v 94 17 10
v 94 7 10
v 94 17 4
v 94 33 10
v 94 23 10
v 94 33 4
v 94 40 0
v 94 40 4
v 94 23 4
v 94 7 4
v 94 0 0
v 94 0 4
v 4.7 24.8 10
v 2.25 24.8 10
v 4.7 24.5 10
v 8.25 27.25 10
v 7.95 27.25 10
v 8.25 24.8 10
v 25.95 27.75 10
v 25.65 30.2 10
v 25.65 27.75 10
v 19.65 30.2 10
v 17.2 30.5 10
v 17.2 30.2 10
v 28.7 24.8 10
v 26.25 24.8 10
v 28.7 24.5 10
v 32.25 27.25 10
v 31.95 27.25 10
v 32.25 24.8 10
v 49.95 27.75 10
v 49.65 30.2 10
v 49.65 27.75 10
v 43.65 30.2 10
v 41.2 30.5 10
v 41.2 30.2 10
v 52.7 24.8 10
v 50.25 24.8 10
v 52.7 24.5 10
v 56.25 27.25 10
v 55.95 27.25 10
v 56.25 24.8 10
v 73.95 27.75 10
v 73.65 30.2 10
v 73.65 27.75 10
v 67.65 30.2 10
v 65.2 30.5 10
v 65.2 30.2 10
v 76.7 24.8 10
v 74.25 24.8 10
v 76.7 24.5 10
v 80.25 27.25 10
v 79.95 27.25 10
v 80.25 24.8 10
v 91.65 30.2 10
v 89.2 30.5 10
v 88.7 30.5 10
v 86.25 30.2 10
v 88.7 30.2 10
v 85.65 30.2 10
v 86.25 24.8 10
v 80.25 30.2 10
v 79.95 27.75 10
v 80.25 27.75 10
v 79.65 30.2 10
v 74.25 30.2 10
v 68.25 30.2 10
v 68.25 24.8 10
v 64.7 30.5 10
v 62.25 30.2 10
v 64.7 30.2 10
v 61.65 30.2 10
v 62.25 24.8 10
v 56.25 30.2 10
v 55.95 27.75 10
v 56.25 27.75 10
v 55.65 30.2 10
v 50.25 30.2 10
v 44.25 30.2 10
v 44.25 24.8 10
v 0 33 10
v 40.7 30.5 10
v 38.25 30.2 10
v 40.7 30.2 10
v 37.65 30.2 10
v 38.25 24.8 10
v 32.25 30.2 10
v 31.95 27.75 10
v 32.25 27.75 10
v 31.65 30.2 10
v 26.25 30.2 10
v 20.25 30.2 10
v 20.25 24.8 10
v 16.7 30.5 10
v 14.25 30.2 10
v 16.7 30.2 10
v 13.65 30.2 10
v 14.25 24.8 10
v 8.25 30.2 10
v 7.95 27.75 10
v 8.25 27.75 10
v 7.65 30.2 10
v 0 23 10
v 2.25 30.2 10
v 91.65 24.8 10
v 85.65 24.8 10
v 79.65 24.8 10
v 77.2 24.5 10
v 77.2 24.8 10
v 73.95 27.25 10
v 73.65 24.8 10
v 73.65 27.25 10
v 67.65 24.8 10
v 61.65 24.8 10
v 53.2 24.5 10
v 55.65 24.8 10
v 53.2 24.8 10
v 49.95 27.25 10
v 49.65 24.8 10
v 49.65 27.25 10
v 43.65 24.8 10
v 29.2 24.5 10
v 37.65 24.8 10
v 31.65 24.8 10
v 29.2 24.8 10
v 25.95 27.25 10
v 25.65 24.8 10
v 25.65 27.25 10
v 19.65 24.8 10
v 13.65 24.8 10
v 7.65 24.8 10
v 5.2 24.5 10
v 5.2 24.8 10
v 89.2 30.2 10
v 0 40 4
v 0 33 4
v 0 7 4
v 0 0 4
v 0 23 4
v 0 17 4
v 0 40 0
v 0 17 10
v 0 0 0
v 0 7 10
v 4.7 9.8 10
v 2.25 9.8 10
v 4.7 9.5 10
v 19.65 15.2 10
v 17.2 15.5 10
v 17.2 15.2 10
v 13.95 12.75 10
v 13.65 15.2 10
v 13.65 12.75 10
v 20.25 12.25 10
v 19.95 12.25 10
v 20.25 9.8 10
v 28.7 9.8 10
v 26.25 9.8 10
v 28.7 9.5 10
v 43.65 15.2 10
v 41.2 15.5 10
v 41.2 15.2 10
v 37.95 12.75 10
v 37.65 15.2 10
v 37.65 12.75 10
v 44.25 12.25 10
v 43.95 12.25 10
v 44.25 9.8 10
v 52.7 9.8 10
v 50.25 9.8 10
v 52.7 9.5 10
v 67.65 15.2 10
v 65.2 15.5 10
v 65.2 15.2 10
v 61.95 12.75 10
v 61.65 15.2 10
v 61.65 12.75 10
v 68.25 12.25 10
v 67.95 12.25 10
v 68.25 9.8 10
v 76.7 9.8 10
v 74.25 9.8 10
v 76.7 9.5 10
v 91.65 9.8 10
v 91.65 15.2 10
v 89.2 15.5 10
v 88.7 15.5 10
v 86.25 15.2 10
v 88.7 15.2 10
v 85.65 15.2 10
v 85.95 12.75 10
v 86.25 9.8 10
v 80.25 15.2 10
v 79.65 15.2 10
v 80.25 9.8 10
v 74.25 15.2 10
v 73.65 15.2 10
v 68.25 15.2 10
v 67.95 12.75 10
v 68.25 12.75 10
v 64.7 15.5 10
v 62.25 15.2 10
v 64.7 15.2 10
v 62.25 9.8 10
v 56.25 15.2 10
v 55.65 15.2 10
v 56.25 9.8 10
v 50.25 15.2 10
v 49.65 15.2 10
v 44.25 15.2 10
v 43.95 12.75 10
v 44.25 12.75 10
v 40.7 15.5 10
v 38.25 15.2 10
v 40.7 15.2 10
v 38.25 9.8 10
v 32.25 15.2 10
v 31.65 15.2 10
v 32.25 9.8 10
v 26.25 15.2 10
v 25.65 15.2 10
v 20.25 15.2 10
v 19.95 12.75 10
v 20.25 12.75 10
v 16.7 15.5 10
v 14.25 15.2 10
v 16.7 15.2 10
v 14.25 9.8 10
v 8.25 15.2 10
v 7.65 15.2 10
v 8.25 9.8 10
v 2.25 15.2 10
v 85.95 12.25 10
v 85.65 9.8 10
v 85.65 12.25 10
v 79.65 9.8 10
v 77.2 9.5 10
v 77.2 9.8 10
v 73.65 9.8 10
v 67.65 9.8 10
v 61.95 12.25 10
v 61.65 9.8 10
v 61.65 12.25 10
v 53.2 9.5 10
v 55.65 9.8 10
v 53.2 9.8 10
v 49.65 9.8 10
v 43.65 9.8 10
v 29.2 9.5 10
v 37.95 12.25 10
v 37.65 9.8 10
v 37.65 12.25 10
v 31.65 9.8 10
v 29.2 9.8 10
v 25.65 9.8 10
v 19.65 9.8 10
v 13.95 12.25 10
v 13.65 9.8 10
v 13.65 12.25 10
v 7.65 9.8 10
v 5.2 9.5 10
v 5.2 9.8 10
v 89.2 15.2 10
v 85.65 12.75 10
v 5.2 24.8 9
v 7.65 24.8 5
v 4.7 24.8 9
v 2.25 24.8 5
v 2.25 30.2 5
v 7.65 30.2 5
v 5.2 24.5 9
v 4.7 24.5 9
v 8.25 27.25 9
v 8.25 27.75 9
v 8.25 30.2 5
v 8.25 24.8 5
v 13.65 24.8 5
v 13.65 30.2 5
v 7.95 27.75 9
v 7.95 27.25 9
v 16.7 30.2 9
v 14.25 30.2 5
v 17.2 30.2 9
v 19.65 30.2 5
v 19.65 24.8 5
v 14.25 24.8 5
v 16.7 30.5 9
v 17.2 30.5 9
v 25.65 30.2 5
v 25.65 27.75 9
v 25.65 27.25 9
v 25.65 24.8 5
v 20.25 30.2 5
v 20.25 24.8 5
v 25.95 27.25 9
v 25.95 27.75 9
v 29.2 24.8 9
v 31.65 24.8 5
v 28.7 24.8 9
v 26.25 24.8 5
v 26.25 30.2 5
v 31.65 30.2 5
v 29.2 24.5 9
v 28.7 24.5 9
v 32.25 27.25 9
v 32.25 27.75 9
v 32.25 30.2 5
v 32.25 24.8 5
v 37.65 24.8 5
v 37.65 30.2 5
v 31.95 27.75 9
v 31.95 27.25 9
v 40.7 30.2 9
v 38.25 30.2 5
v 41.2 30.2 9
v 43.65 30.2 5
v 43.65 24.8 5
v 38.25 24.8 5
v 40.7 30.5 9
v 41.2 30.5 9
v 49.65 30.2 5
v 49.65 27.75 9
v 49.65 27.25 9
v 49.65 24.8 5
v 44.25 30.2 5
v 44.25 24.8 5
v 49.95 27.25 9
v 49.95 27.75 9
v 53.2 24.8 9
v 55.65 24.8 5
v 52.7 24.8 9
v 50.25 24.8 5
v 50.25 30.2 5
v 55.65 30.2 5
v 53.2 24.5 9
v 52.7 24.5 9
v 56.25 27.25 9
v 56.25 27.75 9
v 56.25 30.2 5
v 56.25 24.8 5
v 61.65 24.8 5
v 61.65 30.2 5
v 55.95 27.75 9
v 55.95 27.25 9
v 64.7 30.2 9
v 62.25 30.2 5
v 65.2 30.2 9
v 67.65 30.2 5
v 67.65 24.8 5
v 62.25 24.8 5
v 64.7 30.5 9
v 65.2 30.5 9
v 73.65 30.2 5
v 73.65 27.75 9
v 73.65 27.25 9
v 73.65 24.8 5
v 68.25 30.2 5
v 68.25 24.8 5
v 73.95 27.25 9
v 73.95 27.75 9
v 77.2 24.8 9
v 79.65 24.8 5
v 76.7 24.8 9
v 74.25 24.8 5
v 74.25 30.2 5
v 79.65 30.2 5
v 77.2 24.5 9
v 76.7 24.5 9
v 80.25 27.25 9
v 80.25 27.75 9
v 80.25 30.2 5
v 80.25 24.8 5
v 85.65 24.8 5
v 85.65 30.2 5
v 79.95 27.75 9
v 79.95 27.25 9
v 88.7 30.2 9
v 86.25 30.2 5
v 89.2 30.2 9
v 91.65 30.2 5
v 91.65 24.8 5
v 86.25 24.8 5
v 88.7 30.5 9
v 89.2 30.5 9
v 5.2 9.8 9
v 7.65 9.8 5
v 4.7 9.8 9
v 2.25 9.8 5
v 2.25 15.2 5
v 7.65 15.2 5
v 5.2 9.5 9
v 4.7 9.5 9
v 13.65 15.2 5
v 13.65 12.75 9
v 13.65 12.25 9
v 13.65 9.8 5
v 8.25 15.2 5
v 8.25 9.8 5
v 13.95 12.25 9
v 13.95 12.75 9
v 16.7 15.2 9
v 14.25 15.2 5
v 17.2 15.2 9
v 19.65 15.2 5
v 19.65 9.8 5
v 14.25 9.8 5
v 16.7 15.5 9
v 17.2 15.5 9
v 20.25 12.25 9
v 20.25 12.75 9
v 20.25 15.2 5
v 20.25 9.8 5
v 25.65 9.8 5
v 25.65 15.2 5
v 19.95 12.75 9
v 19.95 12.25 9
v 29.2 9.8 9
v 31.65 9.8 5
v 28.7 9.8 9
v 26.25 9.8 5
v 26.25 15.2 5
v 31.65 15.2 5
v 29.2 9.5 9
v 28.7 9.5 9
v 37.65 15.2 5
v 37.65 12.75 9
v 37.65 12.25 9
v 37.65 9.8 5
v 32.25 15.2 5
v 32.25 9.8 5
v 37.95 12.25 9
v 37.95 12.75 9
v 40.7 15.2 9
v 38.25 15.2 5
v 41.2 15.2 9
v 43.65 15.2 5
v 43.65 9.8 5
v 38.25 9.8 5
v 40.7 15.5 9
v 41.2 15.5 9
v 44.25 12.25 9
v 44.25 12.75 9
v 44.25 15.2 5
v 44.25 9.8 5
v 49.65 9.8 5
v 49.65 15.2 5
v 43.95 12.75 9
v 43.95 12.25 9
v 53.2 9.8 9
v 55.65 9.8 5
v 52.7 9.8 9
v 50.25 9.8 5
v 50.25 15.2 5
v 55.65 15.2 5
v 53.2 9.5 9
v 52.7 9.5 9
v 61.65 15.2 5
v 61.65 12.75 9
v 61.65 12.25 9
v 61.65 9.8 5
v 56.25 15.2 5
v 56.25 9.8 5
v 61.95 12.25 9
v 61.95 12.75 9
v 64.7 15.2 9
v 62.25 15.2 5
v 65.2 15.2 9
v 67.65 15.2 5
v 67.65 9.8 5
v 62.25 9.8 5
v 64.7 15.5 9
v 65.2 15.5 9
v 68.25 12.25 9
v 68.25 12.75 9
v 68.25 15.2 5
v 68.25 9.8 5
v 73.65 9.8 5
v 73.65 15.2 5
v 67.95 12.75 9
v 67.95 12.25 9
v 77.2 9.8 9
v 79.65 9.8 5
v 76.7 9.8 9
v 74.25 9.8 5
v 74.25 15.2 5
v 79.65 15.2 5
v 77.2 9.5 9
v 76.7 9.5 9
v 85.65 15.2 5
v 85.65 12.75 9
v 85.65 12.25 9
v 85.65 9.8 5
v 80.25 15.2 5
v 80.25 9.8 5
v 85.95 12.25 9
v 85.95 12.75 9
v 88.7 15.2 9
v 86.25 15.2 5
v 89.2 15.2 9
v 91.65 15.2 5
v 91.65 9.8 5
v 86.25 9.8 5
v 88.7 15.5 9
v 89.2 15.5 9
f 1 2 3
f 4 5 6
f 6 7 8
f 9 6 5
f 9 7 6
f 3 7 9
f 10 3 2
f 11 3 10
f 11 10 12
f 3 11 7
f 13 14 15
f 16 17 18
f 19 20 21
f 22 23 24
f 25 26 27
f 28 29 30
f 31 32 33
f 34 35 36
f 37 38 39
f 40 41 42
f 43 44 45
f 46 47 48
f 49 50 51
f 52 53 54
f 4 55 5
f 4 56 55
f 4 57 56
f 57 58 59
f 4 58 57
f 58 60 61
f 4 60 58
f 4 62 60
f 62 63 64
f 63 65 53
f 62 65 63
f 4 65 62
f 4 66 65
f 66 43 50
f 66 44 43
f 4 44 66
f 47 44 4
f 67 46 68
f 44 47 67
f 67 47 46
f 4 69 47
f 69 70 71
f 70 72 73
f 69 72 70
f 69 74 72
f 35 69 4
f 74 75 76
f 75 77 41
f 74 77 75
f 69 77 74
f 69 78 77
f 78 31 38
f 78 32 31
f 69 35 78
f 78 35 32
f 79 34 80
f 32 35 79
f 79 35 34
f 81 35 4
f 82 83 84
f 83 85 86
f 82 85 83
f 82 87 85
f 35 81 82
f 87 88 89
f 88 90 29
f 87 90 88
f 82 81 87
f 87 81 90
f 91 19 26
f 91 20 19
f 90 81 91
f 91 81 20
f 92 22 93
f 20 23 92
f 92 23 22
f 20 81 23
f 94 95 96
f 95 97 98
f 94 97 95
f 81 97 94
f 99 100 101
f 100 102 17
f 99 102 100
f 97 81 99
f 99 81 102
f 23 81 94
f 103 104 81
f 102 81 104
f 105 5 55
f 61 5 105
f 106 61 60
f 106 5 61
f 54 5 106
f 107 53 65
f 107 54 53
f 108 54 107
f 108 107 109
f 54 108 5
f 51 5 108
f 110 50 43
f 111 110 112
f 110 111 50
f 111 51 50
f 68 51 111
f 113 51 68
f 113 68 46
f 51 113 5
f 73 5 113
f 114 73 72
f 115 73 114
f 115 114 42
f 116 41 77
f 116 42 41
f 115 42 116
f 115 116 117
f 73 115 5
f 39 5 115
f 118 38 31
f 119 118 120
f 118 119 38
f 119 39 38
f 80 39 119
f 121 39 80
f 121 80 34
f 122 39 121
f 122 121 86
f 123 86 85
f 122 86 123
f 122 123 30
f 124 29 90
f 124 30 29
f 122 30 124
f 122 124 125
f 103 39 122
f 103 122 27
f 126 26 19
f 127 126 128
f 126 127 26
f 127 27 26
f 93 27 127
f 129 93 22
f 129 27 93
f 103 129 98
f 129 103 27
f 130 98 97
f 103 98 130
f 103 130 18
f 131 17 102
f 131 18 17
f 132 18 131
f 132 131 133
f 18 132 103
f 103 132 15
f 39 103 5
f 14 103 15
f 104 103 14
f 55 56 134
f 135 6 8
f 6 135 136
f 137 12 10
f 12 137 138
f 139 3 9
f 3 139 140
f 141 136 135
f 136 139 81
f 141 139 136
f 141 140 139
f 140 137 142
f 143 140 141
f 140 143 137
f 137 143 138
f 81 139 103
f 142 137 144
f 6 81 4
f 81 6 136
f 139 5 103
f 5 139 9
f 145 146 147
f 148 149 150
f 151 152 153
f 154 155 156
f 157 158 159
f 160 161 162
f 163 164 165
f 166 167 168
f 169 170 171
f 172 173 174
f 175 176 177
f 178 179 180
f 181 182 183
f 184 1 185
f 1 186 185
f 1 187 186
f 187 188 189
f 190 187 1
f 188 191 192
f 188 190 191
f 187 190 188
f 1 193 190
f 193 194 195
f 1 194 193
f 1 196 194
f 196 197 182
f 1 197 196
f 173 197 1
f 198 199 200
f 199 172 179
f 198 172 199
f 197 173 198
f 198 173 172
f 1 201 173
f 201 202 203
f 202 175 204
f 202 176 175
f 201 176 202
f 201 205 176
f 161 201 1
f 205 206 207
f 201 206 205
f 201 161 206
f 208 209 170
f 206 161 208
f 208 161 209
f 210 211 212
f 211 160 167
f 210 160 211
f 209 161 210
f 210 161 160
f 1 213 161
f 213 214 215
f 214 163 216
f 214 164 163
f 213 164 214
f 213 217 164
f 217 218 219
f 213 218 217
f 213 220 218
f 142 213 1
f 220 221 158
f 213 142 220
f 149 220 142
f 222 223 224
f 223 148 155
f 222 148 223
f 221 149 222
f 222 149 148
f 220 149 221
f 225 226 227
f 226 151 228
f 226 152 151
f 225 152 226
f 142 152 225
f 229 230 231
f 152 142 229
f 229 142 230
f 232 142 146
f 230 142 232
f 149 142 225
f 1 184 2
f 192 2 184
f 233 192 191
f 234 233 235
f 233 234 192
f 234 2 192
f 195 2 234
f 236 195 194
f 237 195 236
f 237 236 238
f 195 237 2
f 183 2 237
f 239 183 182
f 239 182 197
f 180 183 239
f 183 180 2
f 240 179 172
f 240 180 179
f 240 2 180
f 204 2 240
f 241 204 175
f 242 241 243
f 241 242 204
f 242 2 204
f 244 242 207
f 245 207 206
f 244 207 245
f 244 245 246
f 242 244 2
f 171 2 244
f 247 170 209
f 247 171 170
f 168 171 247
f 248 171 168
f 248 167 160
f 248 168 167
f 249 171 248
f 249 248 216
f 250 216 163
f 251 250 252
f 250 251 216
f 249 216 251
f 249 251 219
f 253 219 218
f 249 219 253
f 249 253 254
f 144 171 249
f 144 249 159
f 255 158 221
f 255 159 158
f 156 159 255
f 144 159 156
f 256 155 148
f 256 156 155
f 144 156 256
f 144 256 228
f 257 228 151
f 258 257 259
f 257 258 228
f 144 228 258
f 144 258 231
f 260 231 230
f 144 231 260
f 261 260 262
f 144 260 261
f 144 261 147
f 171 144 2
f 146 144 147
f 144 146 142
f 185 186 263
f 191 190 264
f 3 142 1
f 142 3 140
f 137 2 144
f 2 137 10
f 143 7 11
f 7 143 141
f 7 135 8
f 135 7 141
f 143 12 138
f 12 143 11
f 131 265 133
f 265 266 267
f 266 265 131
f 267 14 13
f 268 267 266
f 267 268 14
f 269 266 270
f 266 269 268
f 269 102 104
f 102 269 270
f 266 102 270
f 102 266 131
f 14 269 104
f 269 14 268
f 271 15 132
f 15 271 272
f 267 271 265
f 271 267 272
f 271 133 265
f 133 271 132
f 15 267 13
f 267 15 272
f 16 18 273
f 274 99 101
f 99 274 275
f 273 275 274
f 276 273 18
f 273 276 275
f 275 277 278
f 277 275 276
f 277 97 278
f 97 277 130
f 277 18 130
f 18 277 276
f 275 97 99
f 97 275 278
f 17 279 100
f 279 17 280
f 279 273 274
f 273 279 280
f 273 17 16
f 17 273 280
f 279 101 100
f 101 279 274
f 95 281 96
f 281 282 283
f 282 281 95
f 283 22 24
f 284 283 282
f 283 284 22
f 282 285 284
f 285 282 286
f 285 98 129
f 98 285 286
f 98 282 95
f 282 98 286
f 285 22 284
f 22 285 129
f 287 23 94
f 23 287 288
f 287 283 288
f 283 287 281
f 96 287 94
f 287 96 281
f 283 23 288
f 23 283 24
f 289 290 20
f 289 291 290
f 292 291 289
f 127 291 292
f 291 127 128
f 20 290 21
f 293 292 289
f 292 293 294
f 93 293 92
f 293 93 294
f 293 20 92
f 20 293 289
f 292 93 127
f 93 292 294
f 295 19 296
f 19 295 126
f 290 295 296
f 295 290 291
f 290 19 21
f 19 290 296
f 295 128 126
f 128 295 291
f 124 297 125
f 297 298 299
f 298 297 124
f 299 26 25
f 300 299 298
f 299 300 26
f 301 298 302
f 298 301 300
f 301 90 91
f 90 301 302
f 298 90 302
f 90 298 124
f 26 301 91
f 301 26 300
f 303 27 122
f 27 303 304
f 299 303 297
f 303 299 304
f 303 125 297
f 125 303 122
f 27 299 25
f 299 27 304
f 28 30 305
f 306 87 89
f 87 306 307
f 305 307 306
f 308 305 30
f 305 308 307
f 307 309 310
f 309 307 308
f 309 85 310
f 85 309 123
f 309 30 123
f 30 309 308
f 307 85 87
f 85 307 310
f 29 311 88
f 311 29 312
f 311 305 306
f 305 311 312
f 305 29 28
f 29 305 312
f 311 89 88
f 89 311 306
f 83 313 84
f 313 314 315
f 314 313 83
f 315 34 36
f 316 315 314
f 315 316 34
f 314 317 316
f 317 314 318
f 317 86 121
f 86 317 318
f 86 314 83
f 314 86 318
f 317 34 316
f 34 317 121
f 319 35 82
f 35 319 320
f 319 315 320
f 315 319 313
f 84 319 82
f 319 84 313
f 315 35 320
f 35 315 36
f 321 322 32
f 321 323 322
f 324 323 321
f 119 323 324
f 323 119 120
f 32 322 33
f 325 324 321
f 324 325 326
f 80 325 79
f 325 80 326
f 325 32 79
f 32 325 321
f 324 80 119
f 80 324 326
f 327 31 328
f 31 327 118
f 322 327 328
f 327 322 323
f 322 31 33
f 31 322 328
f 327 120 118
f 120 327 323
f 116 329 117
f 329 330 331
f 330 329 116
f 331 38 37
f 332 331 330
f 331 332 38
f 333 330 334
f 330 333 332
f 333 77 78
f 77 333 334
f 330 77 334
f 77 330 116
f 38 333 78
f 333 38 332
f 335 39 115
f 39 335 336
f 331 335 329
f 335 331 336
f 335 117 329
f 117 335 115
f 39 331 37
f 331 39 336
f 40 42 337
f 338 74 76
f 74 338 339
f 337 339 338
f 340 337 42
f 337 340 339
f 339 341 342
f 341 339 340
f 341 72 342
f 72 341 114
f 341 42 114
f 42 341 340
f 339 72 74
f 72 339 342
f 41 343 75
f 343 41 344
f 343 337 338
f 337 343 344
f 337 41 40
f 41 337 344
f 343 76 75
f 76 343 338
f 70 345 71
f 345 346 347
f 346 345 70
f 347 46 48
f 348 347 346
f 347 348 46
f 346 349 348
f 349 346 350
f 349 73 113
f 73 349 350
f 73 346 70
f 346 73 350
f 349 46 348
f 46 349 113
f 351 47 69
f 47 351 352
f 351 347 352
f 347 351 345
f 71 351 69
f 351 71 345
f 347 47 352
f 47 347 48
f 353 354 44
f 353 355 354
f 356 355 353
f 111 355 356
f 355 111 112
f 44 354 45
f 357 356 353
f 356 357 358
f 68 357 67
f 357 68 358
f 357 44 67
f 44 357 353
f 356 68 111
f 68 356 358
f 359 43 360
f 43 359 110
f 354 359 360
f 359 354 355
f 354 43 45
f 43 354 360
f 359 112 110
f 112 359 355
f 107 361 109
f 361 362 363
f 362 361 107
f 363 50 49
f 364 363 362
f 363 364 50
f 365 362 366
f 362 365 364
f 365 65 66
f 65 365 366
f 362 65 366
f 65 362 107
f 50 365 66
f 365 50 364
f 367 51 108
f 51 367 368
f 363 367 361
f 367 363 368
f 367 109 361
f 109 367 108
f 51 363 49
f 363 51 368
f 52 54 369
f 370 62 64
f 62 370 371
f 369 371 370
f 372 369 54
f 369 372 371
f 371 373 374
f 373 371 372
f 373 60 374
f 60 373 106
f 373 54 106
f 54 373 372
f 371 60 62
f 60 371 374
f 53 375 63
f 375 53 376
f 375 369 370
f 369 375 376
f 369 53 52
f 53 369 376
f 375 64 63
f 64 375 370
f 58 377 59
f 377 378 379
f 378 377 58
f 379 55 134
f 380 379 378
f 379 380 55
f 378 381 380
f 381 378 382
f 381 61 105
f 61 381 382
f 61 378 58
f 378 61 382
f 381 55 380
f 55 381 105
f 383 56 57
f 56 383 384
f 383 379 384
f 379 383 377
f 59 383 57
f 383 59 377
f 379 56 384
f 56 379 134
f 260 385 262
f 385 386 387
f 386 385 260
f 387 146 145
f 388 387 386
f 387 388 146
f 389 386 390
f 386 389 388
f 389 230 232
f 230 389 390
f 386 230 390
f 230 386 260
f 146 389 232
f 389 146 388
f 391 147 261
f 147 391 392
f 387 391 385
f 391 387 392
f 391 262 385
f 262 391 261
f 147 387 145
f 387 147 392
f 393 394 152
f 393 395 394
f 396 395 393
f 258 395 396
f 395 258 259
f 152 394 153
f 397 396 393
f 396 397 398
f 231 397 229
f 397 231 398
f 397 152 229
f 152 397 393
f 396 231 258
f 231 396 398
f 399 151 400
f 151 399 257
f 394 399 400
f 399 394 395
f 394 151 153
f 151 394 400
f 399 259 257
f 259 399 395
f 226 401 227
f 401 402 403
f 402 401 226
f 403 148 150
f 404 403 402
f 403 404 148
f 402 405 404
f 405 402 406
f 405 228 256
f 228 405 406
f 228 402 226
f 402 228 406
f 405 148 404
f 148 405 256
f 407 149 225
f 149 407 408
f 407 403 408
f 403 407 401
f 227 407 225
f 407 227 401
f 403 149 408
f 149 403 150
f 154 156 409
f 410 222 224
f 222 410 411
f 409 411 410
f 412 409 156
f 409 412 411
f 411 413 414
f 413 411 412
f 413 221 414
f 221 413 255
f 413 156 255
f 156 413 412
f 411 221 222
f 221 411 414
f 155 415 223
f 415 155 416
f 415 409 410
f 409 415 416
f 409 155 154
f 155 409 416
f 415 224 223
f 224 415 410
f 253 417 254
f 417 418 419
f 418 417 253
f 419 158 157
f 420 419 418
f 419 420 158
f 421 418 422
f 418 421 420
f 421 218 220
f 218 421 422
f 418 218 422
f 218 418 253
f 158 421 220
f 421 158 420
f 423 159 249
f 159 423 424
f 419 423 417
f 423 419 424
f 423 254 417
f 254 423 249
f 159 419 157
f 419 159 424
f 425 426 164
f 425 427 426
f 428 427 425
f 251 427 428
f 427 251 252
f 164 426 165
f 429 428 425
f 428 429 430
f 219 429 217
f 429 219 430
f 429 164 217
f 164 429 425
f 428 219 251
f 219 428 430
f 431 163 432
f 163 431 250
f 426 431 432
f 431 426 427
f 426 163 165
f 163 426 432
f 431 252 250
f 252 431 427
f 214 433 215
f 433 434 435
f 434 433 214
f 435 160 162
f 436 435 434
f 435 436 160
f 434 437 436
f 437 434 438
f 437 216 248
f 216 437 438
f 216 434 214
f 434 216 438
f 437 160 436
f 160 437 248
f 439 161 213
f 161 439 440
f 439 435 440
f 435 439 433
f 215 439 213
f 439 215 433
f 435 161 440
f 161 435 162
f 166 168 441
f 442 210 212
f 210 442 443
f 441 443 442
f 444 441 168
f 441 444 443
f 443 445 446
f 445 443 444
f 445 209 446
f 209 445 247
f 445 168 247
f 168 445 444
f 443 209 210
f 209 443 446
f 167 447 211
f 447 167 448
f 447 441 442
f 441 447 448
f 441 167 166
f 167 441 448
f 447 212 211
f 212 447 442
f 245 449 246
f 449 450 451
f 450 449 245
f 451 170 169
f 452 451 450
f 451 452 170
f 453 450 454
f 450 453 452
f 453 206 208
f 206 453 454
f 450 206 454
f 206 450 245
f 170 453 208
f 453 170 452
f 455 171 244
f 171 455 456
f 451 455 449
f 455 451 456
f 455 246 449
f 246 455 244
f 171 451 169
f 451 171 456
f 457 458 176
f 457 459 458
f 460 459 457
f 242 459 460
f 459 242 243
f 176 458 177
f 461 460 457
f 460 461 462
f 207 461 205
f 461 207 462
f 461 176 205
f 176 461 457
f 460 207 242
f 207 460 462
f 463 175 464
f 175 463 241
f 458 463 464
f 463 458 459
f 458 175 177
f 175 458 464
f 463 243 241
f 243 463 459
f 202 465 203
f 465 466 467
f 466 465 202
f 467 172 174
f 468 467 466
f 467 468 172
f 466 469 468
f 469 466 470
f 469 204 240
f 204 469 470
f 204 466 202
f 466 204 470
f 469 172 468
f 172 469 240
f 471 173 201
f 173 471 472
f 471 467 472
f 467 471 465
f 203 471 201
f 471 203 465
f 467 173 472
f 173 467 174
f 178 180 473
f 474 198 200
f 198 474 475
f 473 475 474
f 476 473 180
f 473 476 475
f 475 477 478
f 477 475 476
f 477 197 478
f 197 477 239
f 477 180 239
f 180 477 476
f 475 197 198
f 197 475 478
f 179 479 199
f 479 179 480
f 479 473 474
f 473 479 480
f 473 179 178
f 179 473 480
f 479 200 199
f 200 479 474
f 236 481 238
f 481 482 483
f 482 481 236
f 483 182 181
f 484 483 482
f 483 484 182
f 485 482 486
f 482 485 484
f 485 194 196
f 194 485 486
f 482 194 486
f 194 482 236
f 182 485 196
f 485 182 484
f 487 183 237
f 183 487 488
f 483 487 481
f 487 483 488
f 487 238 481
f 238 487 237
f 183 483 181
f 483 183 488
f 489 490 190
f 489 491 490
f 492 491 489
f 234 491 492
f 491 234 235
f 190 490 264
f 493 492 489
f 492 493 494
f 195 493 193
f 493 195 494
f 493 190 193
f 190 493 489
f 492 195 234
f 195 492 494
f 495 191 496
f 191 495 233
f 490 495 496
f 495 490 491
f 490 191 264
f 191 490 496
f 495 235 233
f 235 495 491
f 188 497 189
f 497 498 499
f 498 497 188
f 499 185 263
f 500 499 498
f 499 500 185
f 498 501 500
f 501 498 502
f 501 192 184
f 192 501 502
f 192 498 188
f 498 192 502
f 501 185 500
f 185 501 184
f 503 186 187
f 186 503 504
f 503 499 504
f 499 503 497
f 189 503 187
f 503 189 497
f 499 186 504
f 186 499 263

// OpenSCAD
// undulator10mm.scad, v. Ziemann, 240829
// run with "openscad undulator10mm.scad"
// Halbach undulator with 10mm gap, uncompensated field integrals
difference() {
union() {
    cube([94,40,4]);
    color("blue") {
      translate([0,23,4]){cube([94,10,6]);}
      translate([0,7,4]){cube([94,10,6]);}
    }
}
for (i=[0:14]) {translate([4.95+i*6,27.5,8]) {
    rotate([0,0,-90*i-90]) {
        cube([5.4,5.4,6],center=true);
        translate([2.75,0,6]) {cube([0.5,0.5,10],center=true);}
     }}}
for (i=[0:14]) {translate([4.95+i*6,12.5,8]) {
    rotate([0,0,90*i-90]) {
        cube([5.4,5.4,6],center=true);
        translate([2.75,0,6]) {cube([0.5,0.5,10],center=true);}
     }}}
}
